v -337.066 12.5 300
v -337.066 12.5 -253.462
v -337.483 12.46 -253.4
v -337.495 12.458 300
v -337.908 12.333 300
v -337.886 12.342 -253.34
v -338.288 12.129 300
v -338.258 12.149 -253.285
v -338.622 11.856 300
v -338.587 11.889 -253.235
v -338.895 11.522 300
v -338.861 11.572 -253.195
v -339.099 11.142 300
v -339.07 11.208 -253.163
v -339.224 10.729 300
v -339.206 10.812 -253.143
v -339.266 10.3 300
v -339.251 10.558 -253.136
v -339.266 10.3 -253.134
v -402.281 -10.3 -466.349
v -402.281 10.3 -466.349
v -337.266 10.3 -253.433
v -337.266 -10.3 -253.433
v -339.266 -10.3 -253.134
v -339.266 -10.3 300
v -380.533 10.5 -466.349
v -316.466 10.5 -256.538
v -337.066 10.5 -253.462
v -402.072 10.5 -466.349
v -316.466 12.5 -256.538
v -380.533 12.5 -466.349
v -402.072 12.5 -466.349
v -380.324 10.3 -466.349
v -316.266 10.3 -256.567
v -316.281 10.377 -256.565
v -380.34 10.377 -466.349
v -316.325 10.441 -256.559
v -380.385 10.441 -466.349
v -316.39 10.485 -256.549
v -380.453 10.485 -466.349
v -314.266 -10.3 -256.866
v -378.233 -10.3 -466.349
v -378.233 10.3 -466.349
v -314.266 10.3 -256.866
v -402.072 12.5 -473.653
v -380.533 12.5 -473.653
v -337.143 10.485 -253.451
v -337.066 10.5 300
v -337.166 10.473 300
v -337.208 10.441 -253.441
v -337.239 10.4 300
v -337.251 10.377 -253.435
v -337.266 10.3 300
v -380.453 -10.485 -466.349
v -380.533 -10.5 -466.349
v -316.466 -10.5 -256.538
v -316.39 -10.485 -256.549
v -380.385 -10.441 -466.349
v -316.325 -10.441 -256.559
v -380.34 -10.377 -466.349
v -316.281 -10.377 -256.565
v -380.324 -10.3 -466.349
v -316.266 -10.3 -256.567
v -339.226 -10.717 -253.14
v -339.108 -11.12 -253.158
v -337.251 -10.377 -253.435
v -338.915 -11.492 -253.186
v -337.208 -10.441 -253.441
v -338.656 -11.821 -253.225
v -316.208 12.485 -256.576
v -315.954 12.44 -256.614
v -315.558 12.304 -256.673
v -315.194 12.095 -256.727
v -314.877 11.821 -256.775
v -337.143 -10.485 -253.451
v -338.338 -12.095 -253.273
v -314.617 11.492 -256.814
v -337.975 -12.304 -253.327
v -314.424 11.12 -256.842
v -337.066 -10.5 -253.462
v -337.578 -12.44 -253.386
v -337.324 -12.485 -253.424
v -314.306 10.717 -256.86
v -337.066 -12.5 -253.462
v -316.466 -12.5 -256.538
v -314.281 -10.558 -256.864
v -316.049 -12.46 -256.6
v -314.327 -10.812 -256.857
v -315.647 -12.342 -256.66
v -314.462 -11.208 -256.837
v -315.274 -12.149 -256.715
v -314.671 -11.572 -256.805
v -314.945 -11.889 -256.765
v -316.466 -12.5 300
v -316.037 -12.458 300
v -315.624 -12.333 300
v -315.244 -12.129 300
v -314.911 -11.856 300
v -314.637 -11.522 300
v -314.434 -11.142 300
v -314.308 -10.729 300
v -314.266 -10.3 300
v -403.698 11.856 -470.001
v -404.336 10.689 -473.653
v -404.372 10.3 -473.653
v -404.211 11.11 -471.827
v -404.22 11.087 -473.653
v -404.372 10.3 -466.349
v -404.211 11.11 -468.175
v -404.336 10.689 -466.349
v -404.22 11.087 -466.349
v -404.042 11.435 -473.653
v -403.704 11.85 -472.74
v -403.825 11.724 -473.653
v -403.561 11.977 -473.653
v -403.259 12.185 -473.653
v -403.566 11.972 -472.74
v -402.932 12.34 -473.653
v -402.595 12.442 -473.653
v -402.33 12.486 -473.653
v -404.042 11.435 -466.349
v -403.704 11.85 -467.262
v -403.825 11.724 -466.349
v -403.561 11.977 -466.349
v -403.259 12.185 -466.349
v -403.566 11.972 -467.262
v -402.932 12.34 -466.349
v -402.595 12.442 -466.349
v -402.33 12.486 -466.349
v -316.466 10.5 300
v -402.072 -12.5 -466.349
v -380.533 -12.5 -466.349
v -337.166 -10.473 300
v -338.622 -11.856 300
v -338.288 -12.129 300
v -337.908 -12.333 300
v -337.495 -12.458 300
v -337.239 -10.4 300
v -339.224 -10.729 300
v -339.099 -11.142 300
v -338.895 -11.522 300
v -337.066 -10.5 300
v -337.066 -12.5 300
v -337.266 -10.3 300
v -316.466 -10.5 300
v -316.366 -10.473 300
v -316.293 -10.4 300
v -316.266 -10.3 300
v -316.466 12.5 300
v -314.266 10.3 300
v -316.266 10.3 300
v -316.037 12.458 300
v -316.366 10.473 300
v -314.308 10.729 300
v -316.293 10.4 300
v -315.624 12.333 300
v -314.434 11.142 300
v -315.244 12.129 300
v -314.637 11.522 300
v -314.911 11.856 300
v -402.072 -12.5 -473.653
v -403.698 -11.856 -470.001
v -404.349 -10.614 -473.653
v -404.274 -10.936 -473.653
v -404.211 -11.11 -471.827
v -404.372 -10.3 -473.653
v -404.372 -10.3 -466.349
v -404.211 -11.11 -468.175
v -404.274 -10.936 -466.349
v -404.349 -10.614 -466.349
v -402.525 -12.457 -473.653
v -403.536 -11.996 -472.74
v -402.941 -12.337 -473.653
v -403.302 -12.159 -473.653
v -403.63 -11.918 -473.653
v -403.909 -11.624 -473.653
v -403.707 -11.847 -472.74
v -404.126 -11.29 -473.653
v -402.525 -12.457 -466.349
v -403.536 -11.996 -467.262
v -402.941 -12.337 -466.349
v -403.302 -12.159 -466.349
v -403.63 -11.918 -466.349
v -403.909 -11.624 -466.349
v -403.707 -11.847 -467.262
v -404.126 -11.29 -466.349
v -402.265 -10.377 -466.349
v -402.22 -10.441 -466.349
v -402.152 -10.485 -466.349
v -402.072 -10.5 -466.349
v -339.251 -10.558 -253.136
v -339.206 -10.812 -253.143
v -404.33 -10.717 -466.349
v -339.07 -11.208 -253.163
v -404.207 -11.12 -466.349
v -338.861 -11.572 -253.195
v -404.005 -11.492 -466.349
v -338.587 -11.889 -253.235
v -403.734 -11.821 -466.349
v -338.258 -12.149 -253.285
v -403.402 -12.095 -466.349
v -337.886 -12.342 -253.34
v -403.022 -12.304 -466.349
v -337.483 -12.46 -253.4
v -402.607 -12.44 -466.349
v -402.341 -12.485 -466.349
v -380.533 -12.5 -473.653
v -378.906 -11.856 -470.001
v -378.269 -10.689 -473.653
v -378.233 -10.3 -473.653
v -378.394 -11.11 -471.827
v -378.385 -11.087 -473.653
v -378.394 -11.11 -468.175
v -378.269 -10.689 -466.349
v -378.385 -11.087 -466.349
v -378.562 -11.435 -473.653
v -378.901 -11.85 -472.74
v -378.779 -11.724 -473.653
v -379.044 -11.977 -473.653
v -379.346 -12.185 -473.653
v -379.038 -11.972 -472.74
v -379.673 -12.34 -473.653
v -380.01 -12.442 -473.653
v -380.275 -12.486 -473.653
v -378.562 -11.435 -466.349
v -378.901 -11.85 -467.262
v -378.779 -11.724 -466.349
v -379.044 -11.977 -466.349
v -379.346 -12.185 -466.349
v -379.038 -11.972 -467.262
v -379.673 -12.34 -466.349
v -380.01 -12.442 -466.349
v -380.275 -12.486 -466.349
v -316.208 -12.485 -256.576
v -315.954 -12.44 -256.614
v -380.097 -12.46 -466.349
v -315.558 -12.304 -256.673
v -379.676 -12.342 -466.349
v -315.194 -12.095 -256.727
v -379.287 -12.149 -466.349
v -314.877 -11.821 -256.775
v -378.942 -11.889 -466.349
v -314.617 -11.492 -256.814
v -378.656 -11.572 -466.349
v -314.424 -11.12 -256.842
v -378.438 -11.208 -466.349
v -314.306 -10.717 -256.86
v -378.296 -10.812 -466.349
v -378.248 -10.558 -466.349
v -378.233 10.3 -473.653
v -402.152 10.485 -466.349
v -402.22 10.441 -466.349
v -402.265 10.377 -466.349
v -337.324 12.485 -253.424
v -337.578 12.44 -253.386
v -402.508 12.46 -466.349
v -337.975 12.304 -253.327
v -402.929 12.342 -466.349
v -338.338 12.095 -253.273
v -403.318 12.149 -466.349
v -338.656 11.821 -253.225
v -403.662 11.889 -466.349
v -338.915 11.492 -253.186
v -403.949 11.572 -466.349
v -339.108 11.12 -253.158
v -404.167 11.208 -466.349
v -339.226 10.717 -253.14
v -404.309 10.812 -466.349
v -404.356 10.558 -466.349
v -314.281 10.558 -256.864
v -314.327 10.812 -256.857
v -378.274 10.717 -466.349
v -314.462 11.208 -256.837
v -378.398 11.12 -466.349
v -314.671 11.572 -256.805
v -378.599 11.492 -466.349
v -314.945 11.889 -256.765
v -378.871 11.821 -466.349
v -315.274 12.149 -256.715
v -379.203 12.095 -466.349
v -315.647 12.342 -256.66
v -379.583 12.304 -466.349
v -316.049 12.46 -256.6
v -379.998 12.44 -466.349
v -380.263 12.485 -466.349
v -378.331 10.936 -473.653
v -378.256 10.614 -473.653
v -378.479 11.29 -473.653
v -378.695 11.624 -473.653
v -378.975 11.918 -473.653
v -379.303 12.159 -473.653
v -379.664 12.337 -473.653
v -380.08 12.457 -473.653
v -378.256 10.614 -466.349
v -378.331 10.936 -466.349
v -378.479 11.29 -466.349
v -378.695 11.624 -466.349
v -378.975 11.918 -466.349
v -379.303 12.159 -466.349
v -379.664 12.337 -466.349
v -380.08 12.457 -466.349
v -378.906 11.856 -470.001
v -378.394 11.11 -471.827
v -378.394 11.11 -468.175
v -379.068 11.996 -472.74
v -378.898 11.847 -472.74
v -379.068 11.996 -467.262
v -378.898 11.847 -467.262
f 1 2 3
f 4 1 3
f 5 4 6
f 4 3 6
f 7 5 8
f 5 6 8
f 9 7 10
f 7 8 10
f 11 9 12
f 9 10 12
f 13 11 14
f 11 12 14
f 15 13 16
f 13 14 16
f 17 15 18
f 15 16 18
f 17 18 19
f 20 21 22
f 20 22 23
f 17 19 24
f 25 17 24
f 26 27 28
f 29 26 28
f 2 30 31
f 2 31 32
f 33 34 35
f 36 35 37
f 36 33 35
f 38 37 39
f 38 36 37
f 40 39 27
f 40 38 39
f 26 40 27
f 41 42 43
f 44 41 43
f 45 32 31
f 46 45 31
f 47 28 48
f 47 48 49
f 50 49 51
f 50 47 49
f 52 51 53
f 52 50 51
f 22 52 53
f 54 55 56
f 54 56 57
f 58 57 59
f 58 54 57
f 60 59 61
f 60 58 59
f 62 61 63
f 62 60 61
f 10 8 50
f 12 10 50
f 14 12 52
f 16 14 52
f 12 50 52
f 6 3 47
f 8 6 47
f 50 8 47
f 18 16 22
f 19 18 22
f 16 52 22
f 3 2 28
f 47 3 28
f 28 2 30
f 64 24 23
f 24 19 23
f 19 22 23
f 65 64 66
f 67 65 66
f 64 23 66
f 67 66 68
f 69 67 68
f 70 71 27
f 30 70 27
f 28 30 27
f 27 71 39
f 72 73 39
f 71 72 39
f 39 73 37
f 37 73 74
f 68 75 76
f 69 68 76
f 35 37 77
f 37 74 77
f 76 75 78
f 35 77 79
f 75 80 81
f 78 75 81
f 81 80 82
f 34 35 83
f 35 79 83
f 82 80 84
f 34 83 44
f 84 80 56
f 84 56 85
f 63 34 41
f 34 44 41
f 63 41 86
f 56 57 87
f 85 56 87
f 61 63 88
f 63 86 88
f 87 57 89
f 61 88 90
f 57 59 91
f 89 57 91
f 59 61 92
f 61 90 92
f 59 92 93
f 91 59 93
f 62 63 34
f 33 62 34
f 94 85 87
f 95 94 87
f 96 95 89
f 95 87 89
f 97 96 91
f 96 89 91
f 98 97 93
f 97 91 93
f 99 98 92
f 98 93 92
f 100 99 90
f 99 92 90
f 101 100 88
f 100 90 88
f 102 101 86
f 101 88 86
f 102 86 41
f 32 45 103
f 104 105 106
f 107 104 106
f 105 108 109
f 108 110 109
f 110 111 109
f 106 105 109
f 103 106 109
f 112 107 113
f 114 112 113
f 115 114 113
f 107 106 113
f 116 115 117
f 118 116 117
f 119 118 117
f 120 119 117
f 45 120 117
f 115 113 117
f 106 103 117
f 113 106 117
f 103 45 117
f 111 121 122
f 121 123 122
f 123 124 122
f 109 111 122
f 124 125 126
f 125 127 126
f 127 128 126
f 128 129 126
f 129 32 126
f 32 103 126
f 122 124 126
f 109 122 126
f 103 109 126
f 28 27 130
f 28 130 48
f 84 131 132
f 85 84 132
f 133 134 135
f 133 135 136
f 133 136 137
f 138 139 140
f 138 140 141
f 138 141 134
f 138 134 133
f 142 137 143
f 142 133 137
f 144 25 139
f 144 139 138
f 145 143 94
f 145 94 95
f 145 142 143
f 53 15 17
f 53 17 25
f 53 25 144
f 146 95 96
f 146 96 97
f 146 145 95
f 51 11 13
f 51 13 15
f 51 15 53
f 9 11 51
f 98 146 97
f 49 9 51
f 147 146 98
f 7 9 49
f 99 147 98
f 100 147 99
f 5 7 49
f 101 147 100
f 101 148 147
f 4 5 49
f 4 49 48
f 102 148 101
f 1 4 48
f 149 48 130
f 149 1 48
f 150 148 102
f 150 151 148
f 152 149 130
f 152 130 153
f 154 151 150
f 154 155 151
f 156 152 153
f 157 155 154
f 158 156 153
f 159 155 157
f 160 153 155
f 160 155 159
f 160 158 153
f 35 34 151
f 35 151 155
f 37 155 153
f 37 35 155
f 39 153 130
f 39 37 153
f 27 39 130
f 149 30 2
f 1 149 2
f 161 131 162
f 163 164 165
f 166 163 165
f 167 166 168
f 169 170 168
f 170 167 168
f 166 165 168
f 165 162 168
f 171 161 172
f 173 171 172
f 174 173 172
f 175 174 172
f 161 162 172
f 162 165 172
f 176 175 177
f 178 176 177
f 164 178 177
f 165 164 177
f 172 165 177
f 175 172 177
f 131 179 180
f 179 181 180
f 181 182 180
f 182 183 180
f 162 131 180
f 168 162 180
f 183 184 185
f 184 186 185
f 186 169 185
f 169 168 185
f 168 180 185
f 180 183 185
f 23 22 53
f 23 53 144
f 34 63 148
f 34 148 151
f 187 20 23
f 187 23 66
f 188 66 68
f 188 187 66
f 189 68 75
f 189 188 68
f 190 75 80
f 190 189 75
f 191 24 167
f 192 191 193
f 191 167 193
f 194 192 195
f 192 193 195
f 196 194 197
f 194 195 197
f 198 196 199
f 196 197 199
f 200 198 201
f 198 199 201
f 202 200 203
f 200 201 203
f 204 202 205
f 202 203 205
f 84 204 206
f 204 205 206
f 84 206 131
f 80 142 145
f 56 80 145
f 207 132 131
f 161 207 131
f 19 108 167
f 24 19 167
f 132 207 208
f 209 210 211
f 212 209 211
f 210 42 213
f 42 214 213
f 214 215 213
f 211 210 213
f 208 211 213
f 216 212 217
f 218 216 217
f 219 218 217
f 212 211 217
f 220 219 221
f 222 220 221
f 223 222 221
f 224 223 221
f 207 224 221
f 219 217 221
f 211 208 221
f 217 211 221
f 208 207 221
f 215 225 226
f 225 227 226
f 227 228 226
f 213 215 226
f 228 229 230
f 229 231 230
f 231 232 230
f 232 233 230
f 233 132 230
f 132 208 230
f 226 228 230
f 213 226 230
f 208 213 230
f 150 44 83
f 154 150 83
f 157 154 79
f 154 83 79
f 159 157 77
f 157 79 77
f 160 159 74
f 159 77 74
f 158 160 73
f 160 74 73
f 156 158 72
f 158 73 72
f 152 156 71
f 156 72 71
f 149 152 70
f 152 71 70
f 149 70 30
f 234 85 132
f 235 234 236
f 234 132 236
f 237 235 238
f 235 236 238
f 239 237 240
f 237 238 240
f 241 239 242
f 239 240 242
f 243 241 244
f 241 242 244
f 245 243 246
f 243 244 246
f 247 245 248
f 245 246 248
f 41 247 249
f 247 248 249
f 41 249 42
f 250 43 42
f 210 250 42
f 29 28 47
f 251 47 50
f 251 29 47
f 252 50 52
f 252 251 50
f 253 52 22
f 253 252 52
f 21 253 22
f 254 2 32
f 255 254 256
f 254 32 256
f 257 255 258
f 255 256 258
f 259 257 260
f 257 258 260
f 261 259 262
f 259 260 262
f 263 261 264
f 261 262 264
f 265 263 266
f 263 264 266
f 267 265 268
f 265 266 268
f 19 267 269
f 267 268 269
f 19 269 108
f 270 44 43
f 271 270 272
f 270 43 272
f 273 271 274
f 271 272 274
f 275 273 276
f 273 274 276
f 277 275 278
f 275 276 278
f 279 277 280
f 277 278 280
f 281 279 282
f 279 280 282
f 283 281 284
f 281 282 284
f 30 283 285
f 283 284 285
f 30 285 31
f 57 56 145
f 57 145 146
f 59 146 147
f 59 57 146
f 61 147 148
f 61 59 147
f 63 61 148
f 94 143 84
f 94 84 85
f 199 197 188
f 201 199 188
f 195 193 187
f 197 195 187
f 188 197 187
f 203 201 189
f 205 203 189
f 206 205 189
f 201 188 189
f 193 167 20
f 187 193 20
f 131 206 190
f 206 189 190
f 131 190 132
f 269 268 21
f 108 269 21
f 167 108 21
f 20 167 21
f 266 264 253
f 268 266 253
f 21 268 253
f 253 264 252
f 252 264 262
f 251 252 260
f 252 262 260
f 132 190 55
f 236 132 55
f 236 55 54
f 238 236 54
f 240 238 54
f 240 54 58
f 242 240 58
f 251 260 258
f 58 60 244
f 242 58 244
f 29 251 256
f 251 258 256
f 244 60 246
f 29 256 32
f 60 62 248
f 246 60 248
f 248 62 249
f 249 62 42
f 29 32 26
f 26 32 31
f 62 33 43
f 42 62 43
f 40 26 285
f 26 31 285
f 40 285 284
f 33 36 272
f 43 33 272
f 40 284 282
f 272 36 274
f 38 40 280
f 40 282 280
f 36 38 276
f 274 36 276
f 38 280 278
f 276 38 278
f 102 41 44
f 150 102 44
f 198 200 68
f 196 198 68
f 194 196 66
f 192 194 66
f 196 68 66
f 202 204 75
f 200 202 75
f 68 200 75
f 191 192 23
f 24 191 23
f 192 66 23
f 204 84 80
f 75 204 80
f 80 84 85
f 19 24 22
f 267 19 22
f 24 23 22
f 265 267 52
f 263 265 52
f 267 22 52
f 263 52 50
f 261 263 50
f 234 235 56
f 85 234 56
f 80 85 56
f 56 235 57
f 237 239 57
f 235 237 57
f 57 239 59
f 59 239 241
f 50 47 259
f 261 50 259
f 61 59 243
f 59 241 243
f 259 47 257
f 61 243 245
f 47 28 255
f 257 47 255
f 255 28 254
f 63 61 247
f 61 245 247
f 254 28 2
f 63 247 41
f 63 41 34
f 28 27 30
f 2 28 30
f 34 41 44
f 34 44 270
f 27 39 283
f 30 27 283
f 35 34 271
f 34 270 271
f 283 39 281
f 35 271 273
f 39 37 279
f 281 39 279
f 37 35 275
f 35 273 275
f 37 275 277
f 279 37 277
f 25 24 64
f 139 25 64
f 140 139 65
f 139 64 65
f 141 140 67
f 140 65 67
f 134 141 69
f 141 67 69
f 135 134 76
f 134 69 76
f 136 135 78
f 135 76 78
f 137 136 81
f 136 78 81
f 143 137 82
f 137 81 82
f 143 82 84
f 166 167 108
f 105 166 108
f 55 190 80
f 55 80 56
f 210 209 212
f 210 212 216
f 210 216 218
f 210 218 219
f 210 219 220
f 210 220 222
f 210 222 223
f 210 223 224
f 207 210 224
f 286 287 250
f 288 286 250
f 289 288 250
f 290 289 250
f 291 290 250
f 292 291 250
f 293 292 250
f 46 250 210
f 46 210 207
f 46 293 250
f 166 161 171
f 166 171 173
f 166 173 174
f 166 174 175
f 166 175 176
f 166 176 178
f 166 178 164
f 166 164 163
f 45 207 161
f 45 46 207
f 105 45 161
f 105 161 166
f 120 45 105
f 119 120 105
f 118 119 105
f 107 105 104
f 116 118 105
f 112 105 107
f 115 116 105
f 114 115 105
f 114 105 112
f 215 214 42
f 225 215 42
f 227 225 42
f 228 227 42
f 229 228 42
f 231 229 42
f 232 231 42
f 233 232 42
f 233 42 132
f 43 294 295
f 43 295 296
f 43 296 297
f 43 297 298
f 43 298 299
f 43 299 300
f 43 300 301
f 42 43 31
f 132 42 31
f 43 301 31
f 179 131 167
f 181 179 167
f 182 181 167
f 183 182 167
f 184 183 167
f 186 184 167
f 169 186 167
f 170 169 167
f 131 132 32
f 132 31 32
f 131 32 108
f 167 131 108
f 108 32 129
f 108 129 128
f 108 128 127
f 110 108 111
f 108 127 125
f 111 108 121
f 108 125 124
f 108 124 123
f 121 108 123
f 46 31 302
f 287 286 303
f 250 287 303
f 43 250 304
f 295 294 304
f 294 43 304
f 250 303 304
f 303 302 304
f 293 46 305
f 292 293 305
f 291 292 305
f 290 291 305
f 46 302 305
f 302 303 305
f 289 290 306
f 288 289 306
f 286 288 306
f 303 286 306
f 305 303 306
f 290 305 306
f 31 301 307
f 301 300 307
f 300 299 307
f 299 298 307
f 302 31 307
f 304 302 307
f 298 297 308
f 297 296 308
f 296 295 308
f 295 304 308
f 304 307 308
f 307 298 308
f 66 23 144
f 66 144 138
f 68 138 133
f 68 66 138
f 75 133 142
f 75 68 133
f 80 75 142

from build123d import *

# Parameters (mm, degrees)
STRUCTURAL_MEMBER1_DEPTH        = 228.438824066
STRUCTURAL_MEMBER1_2_DEPTH      = 555
STRUCTURAL_MEMBER1_2_DEPTH_BACK = 3.638824066
CUT_EXTRUDE1_DEPTH              = 74
BOSS_EXTRUDE1_DEPTH             = 7.304


with BuildPart() as part:
    # Sketch11 on segment 1 (carried to segment 1) → Structural Member1 (new body)
    with BuildSketch(Plane(origin=(-392.417056908, 0, -470), x_dir=(0.956405694, 0, -0.292041347), z_dir=(0.292041347, 0, 0.956405694))):
        with BuildLine():
            Line((-10.3, -12.5), (10.3, -12.5))
            ThreePointArc((10.3, -12.5), (11.855634919, -11.855634919), (12.5, -10.3))
            Line((12.5, -10.3), (12.5, 10.3))
            ThreePointArc((12.5, 10.3), (11.855634919, 11.855634919), (10.3, 12.5))
            Line((10.3, 12.5), (-10.3, 12.5))
            ThreePointArc((-10.3, 12.5), (-11.855634919, 11.855634919), (-12.5, 10.3))
            Line((-12.5, 10.3), (-12.5, -10.3))
            ThreePointArc((-12.5, -10.3), (-11.855634919, -11.855634919), (-10.3, -12.5))
        make_face()
        with BuildLine():
            Line((-10.3, -10.5), (10.3, -10.5))
            ThreePointArc((10.3, -10.5), (10.441421356, -10.441421356), (10.5, -10.3))
            Line((10.5, -10.3), (10.5, 10.3))
            ThreePointArc((10.5, 10.3), (10.441421356, 10.441421356), (10.3, 10.5))
            Line((10.3, 10.5), (-10.3, 10.5))
            ThreePointArc((-10.3, 10.5), (-10.441421356, 10.441421356), (-10.5, 10.3))
            Line((-10.5, 10.3), (-10.5, -10.3))
            ThreePointArc((-10.5, -10.3), (-10.441421356, -10.441421356), (-10.3, -10.5))
        make_face(mode=Mode.SUBTRACT)
    extrude(amount=STRUCTURAL_MEMBER1_DEPTH)

    # Structural Member1 mitre 1
    split(bisect_by=Plane(origin=(-326.766162017, 0, -255), x_dir=(0, 1, 0), z_dir=(-0.147638589, 0, -0.989041378)), keep=Keep.TOP)

    # Sketch13 → Cut-Extrude1 (cut)
    with BuildSketch(Plane(origin=(0, 42.5, 0), x_dir=(-1, 0, 0), z_dir=(0, 1, 0))):
        Polygon((404.372128083, -466.349483158), (378.232593199, -466.349483158), (380.461985734, -473.650516842), align=None)
    extrude(amount=-CUT_EXTRUDE1_DEPTH, mode=Mode.SUBTRACT)


with BuildPart() as body_2:
    # Sketch11 → Structural Member1 2 (new, two sides: drawn at the far end of the back side and taken through both)
    with BuildSketch(Plane(origin=(-326.766162017, 0, -255), x_dir=(1, 0, 0), z_dir=(0, 0, 1)).offset(-STRUCTURAL_MEMBER1_2_DEPTH_BACK)):
        with BuildLine():
            Line((-10.3, -12.5), (10.3, -12.5))
            ThreePointArc((10.3, -12.5), (11.855634919, -11.855634919), (12.5, -10.3))
            Line((12.5, -10.3), (12.5, 10.3))
            ThreePointArc((12.5, 10.3), (11.855634919, 11.855634919), (10.3, 12.5))
            Line((10.3, 12.5), (-10.3, 12.5))
            ThreePointArc((-10.3, 12.5), (-11.855634919, 11.855634919), (-12.5, 10.3))
            Line((-12.5, 10.3), (-12.5, -10.3))
            ThreePointArc((-12.5, -10.3), (-11.855634919, -11.855634919), (-10.3, -12.5))
        make_face()
        with BuildLine():
            Line((-10.3, -10.5), (10.3, -10.5))
            ThreePointArc((10.3, -10.5), (10.441421356, -10.441421356), (10.5, -10.3))
            Line((10.5, -10.3), (10.5, 10.3))
            ThreePointArc((10.5, 10.3), (10.441421356, 10.441421356), (10.3, 10.5))
            Line((10.3, 10.5), (-10.3, 10.5))
            ThreePointArc((-10.3, 10.5), (-10.441421356, 10.441421356), (-10.5, 10.3))
            Line((-10.5, 10.3), (-10.5, -10.3))
            ThreePointArc((-10.5, -10.3), (-10.441421356, -10.441421356), (-10.3, -10.5))
        make_face(mode=Mode.SUBTRACT)
    extrude(amount=STRUCTURAL_MEMBER1_2_DEPTH + STRUCTURAL_MEMBER1_2_DEPTH_BACK)

    # Structural Member1 2 mitre 1
    split(bisect_by=Plane(origin=(-326.766162017, 0, -255), x_dir=(0, -1, 0), z_dir=(0.147638589, 0, 0.989041378)), keep=Keep.TOP)


with BuildPart() as body_3:
    # Sketch14 → Boss-Extrude1 (new body)
    with BuildSketch(Plane(origin=(0, 0, -466.349483158), x_dir=(-1, 0, 0), z_dir=(0, 0, -1))):
        with BuildLine():
            Line((378.232593199, 10.3), (378.232593199, -10.3))
            add(Edge.make_bspline(
                [(378.232593199, -10.3), (378.232593199, -12.5), (380.532872269, -12.5)],
                knots=[3.141592654, 3.141592654, 3.141592654, 4.71238898, 4.71238898, 4.71238898], degree=2, weights=[1, 0.707106781, 1]))
            Line((380.532872269, -12.5), (402.071849013, -12.5))
            add(Edge.make_bspline(
                [(402.071849013, -12.5), (404.372128083, -12.5), (404.372128083, -10.3)],
                knots=[4.71238898, 4.71238898, 4.71238898, 6.283185307, 6.283185307, 6.283185307], degree=2, weights=[1, 0.707106781, 1]))
            Line((404.372128083, -10.3), (404.372128083, 10.3))
            add(Edge.make_bspline(
                [(404.372128083, 10.3), (404.372128083, 12.5), (402.071849013, 12.5)],
                knots=[0, 0, 0, 1.570796327, 1.570796327, 1.570796327], degree=2, weights=[1, 0.707106781, 1]))
            Line((402.071849013, 12.5), (380.532872269, 12.5))
            add(Edge.make_bspline(
                [(380.532872269, 12.5), (378.232593199, 12.5), (378.232593199, 10.3)],
                knots=[1.570796327, 1.570796327, 1.570796327, 3.141592654, 3.141592654, 3.141592654], degree=2, weights=[1, 0.707106781, 1]))
        make_face()
    extrude(amount=BOSS_EXTRUDE1_DEPTH)


solid = Compound([part.part, body_2.part, body_3.part])
